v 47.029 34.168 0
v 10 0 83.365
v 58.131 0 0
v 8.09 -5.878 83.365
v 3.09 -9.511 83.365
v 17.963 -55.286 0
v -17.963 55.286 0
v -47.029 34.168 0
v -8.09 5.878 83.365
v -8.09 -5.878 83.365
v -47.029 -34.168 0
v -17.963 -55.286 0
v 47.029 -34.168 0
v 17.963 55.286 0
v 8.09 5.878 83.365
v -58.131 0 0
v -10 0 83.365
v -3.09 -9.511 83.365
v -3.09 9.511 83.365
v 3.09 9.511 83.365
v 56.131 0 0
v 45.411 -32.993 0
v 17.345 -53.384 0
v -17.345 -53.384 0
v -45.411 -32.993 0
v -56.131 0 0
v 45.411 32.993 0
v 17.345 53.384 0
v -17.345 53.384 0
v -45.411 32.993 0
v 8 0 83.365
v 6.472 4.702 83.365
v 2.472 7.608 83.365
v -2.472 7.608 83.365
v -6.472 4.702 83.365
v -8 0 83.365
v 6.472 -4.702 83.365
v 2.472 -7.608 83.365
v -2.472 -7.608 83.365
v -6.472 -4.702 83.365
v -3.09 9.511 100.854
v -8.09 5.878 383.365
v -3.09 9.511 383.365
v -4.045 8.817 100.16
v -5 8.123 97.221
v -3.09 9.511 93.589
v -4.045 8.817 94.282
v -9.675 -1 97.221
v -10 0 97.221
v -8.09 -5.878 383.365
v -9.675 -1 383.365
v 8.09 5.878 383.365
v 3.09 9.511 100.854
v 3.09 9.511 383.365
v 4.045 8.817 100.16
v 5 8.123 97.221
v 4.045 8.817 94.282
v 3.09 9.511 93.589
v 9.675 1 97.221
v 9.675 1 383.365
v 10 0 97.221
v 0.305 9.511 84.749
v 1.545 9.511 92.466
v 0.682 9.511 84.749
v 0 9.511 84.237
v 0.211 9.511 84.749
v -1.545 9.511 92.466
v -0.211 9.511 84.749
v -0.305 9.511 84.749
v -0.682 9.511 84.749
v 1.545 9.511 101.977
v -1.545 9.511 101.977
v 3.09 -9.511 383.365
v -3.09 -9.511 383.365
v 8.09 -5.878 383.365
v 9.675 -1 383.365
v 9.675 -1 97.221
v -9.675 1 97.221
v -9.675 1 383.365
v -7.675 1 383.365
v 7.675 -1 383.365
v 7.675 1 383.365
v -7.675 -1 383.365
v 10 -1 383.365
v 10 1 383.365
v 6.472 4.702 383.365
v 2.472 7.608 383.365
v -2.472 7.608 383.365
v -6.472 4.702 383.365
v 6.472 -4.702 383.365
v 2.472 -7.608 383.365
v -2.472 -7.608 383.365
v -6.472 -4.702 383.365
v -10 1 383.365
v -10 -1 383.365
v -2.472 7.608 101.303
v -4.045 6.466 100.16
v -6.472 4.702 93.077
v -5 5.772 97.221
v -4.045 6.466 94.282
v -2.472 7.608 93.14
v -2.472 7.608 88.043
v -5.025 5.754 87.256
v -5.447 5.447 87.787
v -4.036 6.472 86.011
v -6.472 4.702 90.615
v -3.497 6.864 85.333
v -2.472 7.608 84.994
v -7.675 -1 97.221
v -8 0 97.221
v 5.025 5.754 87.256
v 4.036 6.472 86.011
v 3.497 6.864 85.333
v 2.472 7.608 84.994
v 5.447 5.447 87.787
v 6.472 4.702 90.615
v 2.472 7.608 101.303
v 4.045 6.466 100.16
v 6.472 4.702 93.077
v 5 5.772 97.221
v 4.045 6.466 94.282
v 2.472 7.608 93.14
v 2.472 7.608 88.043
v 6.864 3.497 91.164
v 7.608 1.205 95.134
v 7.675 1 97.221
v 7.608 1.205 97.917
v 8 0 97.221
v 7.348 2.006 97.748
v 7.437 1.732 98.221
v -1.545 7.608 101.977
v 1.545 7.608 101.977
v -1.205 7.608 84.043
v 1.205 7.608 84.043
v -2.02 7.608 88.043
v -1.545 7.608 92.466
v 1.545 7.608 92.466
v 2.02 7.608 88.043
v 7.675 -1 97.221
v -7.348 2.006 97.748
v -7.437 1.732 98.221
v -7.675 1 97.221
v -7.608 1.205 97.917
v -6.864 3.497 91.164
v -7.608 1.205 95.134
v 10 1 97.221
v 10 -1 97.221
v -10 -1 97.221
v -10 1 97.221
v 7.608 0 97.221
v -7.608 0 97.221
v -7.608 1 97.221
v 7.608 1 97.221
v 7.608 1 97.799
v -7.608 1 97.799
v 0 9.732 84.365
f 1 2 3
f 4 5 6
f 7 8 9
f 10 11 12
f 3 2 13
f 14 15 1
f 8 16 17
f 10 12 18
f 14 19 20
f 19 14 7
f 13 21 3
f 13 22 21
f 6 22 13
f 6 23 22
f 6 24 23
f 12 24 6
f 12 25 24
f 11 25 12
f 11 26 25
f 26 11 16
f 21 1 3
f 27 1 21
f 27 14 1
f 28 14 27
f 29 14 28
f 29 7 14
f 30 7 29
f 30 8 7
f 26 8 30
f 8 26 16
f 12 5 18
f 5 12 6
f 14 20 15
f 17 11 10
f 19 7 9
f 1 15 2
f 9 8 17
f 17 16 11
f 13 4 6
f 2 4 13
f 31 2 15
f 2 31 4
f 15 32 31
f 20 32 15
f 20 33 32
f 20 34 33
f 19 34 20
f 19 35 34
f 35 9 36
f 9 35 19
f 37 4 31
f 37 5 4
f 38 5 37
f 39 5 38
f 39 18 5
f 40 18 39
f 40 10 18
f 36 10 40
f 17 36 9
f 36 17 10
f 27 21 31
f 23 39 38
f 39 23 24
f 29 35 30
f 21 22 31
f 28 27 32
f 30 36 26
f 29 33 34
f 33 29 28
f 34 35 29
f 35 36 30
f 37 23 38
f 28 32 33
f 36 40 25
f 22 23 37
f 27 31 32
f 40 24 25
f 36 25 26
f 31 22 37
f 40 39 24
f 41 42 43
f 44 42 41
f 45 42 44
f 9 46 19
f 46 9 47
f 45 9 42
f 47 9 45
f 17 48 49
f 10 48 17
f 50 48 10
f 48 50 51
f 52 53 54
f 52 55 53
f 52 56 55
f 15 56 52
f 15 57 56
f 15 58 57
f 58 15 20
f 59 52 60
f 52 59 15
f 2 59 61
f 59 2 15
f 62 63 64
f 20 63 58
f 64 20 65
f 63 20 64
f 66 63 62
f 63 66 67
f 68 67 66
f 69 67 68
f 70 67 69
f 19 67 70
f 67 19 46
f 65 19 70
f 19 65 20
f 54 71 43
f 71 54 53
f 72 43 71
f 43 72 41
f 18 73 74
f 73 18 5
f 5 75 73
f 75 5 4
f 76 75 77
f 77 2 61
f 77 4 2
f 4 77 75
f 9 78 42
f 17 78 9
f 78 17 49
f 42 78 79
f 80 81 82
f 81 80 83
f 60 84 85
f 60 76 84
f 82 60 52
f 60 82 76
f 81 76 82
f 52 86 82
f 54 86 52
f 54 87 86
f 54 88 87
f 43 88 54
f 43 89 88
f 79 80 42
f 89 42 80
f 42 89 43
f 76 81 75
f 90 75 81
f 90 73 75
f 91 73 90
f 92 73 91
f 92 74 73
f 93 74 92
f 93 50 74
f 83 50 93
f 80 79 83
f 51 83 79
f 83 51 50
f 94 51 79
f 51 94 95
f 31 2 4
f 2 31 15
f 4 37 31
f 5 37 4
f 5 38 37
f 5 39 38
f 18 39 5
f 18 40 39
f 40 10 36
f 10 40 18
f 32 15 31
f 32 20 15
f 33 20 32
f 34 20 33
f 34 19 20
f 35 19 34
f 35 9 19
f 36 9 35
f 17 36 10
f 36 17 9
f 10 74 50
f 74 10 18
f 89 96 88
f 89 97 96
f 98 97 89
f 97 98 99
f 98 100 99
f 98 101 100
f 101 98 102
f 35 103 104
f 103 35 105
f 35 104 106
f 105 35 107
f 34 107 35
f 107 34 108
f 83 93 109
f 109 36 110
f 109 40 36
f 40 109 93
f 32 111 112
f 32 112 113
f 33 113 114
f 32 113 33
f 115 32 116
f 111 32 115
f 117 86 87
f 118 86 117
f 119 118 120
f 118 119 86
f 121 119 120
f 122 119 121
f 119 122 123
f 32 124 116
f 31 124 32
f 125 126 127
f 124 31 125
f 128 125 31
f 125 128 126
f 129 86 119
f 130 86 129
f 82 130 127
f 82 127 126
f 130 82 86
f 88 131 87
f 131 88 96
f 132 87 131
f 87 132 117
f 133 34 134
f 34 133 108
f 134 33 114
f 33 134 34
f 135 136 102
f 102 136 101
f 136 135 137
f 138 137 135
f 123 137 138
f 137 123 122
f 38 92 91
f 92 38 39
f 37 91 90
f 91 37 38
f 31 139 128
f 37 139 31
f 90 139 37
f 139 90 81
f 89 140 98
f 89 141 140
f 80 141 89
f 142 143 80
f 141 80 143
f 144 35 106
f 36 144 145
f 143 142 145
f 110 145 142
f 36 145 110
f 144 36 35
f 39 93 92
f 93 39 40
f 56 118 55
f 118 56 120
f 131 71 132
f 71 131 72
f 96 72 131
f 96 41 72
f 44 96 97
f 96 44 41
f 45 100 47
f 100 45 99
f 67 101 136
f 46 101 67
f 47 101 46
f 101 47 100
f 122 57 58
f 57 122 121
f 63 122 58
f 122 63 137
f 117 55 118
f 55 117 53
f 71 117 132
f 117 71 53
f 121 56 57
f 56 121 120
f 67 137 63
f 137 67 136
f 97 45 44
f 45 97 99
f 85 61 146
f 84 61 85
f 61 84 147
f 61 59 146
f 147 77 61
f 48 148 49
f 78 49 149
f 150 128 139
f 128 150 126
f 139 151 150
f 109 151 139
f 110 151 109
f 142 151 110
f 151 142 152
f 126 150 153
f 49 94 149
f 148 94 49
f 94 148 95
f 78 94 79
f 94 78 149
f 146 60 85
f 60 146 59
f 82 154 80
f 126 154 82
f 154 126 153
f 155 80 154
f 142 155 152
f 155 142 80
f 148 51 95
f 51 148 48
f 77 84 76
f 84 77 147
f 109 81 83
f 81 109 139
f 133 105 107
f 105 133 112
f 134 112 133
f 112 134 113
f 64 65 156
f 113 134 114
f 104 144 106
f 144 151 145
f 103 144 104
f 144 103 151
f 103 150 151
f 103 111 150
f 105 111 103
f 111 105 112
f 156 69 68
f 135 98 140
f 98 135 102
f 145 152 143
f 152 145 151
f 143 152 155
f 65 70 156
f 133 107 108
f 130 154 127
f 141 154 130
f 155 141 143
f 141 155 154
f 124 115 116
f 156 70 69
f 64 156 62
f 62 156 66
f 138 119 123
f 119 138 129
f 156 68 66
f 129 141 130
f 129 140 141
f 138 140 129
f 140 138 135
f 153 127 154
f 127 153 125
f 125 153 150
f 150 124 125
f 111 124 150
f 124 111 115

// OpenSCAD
// the total volume of the vessel being filled (in mL)
total_volume = 350;

// the exterior radius of the stem (in mm)
stem_exterior = 10;

// length of the stem (in mm)
stem_length = 300; 

// thickness of the walls (in mm)
wall = 2;

$fn = 10;

// calculated variables
pi = 3.14159;
angle = 60;
stem_volume = pi * pow(stem_exterior - wall, 2) * stem_length / 2;
mouth_volume = (total_volume * 1000) - stem_volume;

// find height and width of the funnel
// start with volume of a cone sections v = pi * h * (d^2 + db + b^2) / 12
// d we already know (stem_exterior - wall) * 2 (its a diameter!)
d = (stem_exterior - wall) * 2;

// b = 2 * ((d/2) + (h / tan(angle))) (it's a diameter too!)
// simplify to b = d + (2h/t) 
// simplifing our equation (using t for tan(angle)) and subbing in b, we get: v = (pi h) (1/12 (d^2+d (d+2×h/t)+(d+2×h/t)^2))
t = tan(angle);
v = mouth_volume;

// use Wolfram|Alpha to solve for h and we get:
// h = 1/2 ((pi d^3 t^3+24 t^2 v)^(1/3)/pi^(1/3)-d t)
mouth_height = 
	(1 / 2) * 
	(	
		(
			pow((pi * pow(d, 3) * pow(t, 3)) + (24 * pow(t, 2) * v), 1/3)
			/
			pow(pi, 1/3)
		)
		- 
		(d * t)	
	);			

// this is the internal mouth width (radius)
mouth_width = (d + ((2 * mouth_height) / t)) / 2;


union() {
	mouth();
	translate([0, 0, mouth_height]) stem();
}

module mouth() {
	difference() {
		cylinder(mouth_height, mouth_width + wall, stem_exterior);
		cylinder(mouth_height, mouth_width, stem_exterior - wall);
	}
}

module stem() {
	union() {
		// seperate the stem into two halfs to let air out
		translate([-stem_exterior, -(wall / 2), (((stem_exterior * 2) - (wall * 2)) * tan(angle) / 2)]) 
		cube([(stem_exterior * 2), wall, stem_length - (((stem_exterior * 2) - (wall * 2)) * tan(angle) / 2)]);
		
		// create a flap at the top of the stem so stuff doesn't go down the air tube
		rotate(a=90, v=[0, 0, 1]) 
		translate([0, 0, ((stem_exterior * 2) - (wall * 2)) * tan(angle) / 2]) 
		rotate(a=60, v=[0, 1, 0]) linear_extrude(height = wall) 
		ellipsePart(height=(stem_exterior * 2) - (wall * 2), width=((stem_exterior * 2) - (wall * 2)) / cos(angle), numQuarters=2);
		
		
		difference() {
			union() {
				// the outside of the stem
				cylinder(stem_length, stem_exterior, stem_exterior);

				// flange to keep airhole out in the open
			//	cylinder(
			//		(((stem_exterior * 2) - (wall * 2)) * tan(angle)) + (wall * 2), 
			//		stem_exterior, 
			//		(tan(angle) * (((stem_exterior * 2) - (wall * 2)) * tan(angle)) + (wall * 2)) - stem_exterior
			//	);
			}
			
			// inside of the stem
			cylinder(stem_length, stem_exterior - wall, stem_exterior - wall);

			// hole for air
			rotate(a=90, v=[1, 0, 0])
			translate([0, (((stem_exterior * 2) - (wall * 2)) * tan(angle) / 2), -((((stem_exterior * 2) - (wall * 2)) * tan(angle)) + (wall * 2))]) 
			cylinder(((((stem_exterior * 2) - (wall * 2)) * tan(angle)) + (wall * 2)), stem_exterior / 2,  stem_exterior / 2);
		}
	}
}


/*
 *  ellipsePart and ellipse are from:
 *  OpenSCAD 2D Shapes Library (www.openscad.org)
 *  Copyright (C) 2012 Peter Uithoven
 *
 *  License: LGPL 2.1 or later
 */

module ellipsePart(width,height,numQuarters)
{
    o = 1; //slight overlap to fix a bug
	difference()
	{
		ellipse(width,height);
		if(numQuarters <= 3)
			translate([0-width/2-o,0-height/2-o,0]) square([width/2+o,height/2+o]);
		if(numQuarters <= 2)
			translate([0-width/2-o,-o,0]) square([width/2+o,height/2+o*2]);
		if(numQuarters < 2)
			translate([-o,0,0]) square([width/2+o*2,height/2+o]);
	}
}

module ellipse(width, height) {
  scale([1, height/width, 1]) circle(r=width/2);
}
